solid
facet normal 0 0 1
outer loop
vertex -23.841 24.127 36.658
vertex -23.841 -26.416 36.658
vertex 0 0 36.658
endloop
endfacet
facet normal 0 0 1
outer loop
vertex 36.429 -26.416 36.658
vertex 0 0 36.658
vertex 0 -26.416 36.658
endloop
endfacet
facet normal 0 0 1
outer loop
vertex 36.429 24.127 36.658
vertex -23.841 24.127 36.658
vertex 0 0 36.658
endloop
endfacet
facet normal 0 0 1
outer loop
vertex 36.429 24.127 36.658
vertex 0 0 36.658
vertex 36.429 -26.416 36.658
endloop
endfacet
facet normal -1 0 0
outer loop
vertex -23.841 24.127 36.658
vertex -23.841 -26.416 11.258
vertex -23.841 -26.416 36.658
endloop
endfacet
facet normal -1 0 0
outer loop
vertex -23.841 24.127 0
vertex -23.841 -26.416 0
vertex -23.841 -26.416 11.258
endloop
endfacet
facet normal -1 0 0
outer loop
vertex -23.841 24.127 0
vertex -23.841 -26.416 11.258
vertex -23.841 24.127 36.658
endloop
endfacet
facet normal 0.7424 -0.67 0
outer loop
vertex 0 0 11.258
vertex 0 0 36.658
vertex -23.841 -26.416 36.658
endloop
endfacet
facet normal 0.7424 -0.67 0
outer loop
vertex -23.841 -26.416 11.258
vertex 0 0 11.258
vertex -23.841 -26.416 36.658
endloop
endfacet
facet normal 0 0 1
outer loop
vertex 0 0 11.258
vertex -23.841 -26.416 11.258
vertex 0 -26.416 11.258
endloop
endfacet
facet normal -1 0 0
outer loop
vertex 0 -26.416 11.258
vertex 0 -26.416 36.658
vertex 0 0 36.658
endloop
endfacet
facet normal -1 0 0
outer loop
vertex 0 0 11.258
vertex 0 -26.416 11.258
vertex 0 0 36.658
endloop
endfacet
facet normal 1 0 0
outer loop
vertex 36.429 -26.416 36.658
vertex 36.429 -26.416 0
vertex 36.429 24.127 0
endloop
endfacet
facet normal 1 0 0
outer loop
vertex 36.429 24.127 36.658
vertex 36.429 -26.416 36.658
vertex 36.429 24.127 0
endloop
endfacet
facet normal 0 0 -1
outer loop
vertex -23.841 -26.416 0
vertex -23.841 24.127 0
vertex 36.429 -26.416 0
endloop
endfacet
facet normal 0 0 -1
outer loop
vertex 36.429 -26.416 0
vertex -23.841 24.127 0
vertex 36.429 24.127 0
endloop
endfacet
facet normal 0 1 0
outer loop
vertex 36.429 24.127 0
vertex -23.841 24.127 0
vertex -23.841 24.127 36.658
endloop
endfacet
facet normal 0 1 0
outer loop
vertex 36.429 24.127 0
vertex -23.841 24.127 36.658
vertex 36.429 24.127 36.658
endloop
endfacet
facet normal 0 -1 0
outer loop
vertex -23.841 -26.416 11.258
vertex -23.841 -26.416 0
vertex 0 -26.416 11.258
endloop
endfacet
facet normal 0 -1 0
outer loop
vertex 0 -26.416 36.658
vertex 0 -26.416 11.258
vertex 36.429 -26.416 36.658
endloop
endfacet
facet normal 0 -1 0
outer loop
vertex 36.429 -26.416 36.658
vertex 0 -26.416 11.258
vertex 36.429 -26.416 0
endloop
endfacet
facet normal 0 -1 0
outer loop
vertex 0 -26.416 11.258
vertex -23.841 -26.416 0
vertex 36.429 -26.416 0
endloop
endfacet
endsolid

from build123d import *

# Parameters (mm, degrees)
F0_W     = 60.269747
F0_H     = 50.542671
F1_DEPTH = 36.65792
F3_DEPTH = 25.4


with BuildPart() as f1:
    # F0 (on Top) → F1 (new body)
    with BuildSketch(Plane.XY):
        with Locations((6.293992, -1.144362)):
            Rectangle(F0_W, F0_H)
    extrude(amount=F1_DEPTH)

    # F2 (on face) → F3 (cut)
    with BuildSketch(Plane.XY.offset(36.65792)):
        Polygon((0, 0), (-23.840882, -26.415698), (0, -26.415698), align=None)
    extrude(amount=-F3_DEPTH, mode=Mode.SUBTRACT)


solid = f1.part
